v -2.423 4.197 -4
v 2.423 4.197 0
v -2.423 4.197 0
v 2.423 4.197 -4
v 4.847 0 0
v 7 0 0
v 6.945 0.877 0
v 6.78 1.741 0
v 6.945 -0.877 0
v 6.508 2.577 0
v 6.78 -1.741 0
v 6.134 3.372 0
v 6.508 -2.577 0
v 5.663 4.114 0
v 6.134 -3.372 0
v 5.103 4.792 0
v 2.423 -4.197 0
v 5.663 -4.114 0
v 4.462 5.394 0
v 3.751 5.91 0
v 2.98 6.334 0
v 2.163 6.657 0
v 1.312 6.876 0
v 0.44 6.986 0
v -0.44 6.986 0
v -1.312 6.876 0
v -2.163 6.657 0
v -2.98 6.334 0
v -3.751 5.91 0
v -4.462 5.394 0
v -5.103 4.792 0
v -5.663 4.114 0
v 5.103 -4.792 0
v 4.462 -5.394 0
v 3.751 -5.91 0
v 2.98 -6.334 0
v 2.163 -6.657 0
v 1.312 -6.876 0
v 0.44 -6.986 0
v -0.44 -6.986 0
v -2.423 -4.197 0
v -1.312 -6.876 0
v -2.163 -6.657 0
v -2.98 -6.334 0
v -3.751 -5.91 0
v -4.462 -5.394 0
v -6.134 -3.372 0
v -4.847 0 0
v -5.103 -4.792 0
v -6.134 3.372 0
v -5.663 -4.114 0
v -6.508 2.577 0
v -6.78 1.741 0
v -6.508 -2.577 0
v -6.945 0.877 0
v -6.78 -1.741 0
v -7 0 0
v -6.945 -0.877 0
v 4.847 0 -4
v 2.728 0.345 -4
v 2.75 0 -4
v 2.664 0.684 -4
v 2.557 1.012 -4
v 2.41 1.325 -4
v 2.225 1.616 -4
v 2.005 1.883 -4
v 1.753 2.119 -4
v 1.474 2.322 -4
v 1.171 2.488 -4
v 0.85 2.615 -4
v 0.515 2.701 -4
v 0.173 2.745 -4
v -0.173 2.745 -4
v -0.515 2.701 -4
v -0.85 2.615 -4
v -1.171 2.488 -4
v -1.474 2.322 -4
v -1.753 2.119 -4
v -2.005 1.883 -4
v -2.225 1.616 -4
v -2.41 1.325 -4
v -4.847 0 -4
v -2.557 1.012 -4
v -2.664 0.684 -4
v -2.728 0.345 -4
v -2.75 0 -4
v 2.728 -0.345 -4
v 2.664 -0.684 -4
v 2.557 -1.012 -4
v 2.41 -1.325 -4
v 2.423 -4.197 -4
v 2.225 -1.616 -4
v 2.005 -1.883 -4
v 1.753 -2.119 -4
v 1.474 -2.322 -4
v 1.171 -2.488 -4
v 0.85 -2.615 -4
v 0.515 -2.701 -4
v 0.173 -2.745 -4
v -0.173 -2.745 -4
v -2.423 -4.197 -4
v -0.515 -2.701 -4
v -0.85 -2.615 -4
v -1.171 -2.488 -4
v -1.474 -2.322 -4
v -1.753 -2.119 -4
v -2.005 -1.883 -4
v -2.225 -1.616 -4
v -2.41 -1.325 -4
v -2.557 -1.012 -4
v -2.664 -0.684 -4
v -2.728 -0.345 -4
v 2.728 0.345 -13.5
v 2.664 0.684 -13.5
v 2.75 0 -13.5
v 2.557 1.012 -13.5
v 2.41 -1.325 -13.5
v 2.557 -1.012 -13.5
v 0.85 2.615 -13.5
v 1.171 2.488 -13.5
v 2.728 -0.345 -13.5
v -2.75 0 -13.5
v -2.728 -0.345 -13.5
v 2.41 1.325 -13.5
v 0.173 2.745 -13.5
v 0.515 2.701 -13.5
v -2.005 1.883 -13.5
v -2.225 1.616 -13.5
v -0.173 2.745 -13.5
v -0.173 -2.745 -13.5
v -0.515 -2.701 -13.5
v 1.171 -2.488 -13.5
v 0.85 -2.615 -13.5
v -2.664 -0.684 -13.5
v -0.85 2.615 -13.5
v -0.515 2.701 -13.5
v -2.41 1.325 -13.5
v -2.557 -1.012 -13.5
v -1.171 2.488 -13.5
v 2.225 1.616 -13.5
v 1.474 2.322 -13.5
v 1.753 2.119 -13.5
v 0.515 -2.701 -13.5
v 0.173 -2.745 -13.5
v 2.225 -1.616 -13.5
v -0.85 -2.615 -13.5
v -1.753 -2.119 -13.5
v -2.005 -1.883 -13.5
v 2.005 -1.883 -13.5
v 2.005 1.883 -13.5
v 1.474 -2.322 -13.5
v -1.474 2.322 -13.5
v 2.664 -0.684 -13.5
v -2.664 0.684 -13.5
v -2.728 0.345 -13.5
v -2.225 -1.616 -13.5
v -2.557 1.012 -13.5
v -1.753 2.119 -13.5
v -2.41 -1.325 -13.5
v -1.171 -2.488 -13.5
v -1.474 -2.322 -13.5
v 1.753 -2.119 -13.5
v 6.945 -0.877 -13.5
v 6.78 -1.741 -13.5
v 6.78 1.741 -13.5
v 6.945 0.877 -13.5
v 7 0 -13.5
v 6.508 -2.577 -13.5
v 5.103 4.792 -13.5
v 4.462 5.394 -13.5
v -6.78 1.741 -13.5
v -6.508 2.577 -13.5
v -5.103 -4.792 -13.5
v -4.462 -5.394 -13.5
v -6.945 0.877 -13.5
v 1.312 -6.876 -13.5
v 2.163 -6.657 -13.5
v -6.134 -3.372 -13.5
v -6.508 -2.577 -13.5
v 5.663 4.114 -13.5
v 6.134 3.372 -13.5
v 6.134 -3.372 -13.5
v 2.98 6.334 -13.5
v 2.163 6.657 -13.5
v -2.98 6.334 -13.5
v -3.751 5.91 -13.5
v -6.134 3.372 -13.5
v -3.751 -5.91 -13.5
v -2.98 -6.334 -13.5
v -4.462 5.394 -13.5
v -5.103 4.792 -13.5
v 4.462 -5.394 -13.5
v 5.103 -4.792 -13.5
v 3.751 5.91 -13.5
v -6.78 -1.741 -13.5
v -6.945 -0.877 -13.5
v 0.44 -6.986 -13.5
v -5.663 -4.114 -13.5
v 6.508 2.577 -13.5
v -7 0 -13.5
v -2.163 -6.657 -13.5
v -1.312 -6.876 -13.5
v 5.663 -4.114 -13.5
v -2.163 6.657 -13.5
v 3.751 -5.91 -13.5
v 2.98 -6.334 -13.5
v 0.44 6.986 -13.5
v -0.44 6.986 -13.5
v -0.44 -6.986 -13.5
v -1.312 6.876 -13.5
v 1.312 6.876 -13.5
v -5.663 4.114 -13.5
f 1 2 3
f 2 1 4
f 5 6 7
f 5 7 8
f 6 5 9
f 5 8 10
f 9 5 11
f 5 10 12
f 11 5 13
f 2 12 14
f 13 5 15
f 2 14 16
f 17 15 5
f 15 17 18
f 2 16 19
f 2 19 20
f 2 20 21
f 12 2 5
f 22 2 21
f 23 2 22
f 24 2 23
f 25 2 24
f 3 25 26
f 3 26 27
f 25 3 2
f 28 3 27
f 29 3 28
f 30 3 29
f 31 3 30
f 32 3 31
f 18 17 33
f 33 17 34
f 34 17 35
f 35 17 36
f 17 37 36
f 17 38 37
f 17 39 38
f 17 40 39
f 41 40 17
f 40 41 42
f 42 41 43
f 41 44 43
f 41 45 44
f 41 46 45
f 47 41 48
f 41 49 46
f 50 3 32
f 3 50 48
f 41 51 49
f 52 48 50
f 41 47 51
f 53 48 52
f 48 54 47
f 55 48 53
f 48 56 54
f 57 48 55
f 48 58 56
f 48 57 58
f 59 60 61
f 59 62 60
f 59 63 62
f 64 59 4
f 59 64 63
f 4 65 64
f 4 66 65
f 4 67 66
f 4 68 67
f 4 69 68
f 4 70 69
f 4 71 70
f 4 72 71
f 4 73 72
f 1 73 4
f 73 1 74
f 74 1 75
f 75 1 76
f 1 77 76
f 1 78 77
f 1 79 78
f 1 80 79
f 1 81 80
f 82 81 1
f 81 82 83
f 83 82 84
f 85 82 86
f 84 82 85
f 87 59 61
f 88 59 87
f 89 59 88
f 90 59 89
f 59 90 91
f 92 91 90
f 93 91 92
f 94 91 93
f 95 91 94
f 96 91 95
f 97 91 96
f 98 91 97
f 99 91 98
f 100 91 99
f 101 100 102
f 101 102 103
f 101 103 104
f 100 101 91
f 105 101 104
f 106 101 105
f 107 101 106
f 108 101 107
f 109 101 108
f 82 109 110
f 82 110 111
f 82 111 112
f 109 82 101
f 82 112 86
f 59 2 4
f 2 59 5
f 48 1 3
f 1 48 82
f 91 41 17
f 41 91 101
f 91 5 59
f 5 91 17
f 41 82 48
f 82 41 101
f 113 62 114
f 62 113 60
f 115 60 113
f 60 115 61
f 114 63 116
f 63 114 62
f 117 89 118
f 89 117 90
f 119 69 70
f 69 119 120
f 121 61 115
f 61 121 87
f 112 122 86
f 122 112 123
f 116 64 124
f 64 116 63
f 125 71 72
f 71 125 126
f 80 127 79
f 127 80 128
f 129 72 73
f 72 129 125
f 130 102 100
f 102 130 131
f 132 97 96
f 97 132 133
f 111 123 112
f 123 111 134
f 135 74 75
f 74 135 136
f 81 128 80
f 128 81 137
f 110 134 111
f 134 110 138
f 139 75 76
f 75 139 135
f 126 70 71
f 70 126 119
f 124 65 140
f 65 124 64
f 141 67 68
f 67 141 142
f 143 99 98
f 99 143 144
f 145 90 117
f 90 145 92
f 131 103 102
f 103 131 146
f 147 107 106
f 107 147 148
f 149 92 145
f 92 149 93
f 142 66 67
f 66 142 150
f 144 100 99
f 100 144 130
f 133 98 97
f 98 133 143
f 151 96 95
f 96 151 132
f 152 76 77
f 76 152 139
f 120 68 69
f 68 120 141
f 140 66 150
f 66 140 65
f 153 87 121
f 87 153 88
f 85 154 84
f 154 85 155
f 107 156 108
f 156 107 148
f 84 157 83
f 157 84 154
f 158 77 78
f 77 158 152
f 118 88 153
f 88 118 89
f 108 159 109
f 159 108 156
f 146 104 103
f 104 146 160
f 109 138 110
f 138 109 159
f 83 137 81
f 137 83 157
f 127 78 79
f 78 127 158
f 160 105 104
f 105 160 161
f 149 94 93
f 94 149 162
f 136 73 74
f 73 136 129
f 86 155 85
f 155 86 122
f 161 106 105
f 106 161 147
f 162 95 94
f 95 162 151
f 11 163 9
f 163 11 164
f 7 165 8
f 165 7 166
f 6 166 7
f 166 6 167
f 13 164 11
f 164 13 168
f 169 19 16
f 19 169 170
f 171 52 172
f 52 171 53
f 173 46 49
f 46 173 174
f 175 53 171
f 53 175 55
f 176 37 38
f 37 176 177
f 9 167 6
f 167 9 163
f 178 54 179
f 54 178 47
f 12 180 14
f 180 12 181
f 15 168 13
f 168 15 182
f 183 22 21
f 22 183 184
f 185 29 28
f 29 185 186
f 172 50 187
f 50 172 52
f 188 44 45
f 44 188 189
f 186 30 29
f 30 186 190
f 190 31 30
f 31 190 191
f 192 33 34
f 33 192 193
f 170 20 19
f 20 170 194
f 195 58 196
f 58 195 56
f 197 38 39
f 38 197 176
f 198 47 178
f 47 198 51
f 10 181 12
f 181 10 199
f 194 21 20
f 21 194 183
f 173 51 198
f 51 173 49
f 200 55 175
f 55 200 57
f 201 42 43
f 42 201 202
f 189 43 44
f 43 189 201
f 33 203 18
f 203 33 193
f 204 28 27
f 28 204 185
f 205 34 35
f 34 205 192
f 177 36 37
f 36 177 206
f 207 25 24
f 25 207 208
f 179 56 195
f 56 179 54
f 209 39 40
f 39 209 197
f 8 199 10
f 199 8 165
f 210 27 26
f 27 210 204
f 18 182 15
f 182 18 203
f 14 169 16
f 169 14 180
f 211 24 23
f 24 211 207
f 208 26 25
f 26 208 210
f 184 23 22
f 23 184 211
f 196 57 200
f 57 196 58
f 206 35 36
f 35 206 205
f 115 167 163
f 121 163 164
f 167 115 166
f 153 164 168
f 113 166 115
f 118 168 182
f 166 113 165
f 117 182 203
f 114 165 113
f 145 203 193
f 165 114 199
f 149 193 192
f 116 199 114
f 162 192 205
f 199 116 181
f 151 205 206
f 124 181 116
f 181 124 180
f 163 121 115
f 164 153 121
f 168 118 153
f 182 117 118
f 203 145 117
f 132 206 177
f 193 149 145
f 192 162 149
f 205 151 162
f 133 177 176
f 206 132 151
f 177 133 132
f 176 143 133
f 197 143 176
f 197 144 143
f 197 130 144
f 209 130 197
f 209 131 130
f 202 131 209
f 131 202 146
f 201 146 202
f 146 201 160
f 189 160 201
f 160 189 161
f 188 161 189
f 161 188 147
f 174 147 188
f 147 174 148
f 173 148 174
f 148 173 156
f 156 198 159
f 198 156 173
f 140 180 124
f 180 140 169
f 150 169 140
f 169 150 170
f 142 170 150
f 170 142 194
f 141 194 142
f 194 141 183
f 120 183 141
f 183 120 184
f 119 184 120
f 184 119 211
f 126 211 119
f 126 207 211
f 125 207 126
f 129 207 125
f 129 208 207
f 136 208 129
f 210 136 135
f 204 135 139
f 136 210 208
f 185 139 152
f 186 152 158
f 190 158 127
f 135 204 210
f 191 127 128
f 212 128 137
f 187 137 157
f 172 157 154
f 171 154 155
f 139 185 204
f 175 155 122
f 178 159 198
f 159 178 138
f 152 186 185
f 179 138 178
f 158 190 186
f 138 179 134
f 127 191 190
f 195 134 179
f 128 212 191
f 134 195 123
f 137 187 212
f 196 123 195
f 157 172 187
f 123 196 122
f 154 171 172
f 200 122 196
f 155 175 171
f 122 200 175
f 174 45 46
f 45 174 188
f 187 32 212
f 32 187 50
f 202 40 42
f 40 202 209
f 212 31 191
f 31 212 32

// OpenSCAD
$fn = 50;

difference() {
	union() {
		translate(v = [0, 0, -13.5]) {
			cylinder(h = 13.5, r = 7.0);
		}
	}
	union() {
		translate(v = [0, 0, 0]) {
			rotate(a = [0, 0, 0]) {
				difference() {
					union() {
						translate(v = [0, 0, -4]) {
							linear_extrude(height = 4) {
								polygon(points = [[4.8468, 0.0], [2.4234000000000004, 4.197451927062417], [-2.423399999999999, 4.197451927062417], [-4.8468, 5.935618106107392e-16], [-2.423400000000002, -4.197451927062416], [2.423399999999997, -4.197451927062419]]);
							}
						}
					}
					union();
				}
			}
		}
		#translate(v = [0, 0, -100.0]) {
			cylinder(h = 200, r = 2.75);
		}
	}
}
